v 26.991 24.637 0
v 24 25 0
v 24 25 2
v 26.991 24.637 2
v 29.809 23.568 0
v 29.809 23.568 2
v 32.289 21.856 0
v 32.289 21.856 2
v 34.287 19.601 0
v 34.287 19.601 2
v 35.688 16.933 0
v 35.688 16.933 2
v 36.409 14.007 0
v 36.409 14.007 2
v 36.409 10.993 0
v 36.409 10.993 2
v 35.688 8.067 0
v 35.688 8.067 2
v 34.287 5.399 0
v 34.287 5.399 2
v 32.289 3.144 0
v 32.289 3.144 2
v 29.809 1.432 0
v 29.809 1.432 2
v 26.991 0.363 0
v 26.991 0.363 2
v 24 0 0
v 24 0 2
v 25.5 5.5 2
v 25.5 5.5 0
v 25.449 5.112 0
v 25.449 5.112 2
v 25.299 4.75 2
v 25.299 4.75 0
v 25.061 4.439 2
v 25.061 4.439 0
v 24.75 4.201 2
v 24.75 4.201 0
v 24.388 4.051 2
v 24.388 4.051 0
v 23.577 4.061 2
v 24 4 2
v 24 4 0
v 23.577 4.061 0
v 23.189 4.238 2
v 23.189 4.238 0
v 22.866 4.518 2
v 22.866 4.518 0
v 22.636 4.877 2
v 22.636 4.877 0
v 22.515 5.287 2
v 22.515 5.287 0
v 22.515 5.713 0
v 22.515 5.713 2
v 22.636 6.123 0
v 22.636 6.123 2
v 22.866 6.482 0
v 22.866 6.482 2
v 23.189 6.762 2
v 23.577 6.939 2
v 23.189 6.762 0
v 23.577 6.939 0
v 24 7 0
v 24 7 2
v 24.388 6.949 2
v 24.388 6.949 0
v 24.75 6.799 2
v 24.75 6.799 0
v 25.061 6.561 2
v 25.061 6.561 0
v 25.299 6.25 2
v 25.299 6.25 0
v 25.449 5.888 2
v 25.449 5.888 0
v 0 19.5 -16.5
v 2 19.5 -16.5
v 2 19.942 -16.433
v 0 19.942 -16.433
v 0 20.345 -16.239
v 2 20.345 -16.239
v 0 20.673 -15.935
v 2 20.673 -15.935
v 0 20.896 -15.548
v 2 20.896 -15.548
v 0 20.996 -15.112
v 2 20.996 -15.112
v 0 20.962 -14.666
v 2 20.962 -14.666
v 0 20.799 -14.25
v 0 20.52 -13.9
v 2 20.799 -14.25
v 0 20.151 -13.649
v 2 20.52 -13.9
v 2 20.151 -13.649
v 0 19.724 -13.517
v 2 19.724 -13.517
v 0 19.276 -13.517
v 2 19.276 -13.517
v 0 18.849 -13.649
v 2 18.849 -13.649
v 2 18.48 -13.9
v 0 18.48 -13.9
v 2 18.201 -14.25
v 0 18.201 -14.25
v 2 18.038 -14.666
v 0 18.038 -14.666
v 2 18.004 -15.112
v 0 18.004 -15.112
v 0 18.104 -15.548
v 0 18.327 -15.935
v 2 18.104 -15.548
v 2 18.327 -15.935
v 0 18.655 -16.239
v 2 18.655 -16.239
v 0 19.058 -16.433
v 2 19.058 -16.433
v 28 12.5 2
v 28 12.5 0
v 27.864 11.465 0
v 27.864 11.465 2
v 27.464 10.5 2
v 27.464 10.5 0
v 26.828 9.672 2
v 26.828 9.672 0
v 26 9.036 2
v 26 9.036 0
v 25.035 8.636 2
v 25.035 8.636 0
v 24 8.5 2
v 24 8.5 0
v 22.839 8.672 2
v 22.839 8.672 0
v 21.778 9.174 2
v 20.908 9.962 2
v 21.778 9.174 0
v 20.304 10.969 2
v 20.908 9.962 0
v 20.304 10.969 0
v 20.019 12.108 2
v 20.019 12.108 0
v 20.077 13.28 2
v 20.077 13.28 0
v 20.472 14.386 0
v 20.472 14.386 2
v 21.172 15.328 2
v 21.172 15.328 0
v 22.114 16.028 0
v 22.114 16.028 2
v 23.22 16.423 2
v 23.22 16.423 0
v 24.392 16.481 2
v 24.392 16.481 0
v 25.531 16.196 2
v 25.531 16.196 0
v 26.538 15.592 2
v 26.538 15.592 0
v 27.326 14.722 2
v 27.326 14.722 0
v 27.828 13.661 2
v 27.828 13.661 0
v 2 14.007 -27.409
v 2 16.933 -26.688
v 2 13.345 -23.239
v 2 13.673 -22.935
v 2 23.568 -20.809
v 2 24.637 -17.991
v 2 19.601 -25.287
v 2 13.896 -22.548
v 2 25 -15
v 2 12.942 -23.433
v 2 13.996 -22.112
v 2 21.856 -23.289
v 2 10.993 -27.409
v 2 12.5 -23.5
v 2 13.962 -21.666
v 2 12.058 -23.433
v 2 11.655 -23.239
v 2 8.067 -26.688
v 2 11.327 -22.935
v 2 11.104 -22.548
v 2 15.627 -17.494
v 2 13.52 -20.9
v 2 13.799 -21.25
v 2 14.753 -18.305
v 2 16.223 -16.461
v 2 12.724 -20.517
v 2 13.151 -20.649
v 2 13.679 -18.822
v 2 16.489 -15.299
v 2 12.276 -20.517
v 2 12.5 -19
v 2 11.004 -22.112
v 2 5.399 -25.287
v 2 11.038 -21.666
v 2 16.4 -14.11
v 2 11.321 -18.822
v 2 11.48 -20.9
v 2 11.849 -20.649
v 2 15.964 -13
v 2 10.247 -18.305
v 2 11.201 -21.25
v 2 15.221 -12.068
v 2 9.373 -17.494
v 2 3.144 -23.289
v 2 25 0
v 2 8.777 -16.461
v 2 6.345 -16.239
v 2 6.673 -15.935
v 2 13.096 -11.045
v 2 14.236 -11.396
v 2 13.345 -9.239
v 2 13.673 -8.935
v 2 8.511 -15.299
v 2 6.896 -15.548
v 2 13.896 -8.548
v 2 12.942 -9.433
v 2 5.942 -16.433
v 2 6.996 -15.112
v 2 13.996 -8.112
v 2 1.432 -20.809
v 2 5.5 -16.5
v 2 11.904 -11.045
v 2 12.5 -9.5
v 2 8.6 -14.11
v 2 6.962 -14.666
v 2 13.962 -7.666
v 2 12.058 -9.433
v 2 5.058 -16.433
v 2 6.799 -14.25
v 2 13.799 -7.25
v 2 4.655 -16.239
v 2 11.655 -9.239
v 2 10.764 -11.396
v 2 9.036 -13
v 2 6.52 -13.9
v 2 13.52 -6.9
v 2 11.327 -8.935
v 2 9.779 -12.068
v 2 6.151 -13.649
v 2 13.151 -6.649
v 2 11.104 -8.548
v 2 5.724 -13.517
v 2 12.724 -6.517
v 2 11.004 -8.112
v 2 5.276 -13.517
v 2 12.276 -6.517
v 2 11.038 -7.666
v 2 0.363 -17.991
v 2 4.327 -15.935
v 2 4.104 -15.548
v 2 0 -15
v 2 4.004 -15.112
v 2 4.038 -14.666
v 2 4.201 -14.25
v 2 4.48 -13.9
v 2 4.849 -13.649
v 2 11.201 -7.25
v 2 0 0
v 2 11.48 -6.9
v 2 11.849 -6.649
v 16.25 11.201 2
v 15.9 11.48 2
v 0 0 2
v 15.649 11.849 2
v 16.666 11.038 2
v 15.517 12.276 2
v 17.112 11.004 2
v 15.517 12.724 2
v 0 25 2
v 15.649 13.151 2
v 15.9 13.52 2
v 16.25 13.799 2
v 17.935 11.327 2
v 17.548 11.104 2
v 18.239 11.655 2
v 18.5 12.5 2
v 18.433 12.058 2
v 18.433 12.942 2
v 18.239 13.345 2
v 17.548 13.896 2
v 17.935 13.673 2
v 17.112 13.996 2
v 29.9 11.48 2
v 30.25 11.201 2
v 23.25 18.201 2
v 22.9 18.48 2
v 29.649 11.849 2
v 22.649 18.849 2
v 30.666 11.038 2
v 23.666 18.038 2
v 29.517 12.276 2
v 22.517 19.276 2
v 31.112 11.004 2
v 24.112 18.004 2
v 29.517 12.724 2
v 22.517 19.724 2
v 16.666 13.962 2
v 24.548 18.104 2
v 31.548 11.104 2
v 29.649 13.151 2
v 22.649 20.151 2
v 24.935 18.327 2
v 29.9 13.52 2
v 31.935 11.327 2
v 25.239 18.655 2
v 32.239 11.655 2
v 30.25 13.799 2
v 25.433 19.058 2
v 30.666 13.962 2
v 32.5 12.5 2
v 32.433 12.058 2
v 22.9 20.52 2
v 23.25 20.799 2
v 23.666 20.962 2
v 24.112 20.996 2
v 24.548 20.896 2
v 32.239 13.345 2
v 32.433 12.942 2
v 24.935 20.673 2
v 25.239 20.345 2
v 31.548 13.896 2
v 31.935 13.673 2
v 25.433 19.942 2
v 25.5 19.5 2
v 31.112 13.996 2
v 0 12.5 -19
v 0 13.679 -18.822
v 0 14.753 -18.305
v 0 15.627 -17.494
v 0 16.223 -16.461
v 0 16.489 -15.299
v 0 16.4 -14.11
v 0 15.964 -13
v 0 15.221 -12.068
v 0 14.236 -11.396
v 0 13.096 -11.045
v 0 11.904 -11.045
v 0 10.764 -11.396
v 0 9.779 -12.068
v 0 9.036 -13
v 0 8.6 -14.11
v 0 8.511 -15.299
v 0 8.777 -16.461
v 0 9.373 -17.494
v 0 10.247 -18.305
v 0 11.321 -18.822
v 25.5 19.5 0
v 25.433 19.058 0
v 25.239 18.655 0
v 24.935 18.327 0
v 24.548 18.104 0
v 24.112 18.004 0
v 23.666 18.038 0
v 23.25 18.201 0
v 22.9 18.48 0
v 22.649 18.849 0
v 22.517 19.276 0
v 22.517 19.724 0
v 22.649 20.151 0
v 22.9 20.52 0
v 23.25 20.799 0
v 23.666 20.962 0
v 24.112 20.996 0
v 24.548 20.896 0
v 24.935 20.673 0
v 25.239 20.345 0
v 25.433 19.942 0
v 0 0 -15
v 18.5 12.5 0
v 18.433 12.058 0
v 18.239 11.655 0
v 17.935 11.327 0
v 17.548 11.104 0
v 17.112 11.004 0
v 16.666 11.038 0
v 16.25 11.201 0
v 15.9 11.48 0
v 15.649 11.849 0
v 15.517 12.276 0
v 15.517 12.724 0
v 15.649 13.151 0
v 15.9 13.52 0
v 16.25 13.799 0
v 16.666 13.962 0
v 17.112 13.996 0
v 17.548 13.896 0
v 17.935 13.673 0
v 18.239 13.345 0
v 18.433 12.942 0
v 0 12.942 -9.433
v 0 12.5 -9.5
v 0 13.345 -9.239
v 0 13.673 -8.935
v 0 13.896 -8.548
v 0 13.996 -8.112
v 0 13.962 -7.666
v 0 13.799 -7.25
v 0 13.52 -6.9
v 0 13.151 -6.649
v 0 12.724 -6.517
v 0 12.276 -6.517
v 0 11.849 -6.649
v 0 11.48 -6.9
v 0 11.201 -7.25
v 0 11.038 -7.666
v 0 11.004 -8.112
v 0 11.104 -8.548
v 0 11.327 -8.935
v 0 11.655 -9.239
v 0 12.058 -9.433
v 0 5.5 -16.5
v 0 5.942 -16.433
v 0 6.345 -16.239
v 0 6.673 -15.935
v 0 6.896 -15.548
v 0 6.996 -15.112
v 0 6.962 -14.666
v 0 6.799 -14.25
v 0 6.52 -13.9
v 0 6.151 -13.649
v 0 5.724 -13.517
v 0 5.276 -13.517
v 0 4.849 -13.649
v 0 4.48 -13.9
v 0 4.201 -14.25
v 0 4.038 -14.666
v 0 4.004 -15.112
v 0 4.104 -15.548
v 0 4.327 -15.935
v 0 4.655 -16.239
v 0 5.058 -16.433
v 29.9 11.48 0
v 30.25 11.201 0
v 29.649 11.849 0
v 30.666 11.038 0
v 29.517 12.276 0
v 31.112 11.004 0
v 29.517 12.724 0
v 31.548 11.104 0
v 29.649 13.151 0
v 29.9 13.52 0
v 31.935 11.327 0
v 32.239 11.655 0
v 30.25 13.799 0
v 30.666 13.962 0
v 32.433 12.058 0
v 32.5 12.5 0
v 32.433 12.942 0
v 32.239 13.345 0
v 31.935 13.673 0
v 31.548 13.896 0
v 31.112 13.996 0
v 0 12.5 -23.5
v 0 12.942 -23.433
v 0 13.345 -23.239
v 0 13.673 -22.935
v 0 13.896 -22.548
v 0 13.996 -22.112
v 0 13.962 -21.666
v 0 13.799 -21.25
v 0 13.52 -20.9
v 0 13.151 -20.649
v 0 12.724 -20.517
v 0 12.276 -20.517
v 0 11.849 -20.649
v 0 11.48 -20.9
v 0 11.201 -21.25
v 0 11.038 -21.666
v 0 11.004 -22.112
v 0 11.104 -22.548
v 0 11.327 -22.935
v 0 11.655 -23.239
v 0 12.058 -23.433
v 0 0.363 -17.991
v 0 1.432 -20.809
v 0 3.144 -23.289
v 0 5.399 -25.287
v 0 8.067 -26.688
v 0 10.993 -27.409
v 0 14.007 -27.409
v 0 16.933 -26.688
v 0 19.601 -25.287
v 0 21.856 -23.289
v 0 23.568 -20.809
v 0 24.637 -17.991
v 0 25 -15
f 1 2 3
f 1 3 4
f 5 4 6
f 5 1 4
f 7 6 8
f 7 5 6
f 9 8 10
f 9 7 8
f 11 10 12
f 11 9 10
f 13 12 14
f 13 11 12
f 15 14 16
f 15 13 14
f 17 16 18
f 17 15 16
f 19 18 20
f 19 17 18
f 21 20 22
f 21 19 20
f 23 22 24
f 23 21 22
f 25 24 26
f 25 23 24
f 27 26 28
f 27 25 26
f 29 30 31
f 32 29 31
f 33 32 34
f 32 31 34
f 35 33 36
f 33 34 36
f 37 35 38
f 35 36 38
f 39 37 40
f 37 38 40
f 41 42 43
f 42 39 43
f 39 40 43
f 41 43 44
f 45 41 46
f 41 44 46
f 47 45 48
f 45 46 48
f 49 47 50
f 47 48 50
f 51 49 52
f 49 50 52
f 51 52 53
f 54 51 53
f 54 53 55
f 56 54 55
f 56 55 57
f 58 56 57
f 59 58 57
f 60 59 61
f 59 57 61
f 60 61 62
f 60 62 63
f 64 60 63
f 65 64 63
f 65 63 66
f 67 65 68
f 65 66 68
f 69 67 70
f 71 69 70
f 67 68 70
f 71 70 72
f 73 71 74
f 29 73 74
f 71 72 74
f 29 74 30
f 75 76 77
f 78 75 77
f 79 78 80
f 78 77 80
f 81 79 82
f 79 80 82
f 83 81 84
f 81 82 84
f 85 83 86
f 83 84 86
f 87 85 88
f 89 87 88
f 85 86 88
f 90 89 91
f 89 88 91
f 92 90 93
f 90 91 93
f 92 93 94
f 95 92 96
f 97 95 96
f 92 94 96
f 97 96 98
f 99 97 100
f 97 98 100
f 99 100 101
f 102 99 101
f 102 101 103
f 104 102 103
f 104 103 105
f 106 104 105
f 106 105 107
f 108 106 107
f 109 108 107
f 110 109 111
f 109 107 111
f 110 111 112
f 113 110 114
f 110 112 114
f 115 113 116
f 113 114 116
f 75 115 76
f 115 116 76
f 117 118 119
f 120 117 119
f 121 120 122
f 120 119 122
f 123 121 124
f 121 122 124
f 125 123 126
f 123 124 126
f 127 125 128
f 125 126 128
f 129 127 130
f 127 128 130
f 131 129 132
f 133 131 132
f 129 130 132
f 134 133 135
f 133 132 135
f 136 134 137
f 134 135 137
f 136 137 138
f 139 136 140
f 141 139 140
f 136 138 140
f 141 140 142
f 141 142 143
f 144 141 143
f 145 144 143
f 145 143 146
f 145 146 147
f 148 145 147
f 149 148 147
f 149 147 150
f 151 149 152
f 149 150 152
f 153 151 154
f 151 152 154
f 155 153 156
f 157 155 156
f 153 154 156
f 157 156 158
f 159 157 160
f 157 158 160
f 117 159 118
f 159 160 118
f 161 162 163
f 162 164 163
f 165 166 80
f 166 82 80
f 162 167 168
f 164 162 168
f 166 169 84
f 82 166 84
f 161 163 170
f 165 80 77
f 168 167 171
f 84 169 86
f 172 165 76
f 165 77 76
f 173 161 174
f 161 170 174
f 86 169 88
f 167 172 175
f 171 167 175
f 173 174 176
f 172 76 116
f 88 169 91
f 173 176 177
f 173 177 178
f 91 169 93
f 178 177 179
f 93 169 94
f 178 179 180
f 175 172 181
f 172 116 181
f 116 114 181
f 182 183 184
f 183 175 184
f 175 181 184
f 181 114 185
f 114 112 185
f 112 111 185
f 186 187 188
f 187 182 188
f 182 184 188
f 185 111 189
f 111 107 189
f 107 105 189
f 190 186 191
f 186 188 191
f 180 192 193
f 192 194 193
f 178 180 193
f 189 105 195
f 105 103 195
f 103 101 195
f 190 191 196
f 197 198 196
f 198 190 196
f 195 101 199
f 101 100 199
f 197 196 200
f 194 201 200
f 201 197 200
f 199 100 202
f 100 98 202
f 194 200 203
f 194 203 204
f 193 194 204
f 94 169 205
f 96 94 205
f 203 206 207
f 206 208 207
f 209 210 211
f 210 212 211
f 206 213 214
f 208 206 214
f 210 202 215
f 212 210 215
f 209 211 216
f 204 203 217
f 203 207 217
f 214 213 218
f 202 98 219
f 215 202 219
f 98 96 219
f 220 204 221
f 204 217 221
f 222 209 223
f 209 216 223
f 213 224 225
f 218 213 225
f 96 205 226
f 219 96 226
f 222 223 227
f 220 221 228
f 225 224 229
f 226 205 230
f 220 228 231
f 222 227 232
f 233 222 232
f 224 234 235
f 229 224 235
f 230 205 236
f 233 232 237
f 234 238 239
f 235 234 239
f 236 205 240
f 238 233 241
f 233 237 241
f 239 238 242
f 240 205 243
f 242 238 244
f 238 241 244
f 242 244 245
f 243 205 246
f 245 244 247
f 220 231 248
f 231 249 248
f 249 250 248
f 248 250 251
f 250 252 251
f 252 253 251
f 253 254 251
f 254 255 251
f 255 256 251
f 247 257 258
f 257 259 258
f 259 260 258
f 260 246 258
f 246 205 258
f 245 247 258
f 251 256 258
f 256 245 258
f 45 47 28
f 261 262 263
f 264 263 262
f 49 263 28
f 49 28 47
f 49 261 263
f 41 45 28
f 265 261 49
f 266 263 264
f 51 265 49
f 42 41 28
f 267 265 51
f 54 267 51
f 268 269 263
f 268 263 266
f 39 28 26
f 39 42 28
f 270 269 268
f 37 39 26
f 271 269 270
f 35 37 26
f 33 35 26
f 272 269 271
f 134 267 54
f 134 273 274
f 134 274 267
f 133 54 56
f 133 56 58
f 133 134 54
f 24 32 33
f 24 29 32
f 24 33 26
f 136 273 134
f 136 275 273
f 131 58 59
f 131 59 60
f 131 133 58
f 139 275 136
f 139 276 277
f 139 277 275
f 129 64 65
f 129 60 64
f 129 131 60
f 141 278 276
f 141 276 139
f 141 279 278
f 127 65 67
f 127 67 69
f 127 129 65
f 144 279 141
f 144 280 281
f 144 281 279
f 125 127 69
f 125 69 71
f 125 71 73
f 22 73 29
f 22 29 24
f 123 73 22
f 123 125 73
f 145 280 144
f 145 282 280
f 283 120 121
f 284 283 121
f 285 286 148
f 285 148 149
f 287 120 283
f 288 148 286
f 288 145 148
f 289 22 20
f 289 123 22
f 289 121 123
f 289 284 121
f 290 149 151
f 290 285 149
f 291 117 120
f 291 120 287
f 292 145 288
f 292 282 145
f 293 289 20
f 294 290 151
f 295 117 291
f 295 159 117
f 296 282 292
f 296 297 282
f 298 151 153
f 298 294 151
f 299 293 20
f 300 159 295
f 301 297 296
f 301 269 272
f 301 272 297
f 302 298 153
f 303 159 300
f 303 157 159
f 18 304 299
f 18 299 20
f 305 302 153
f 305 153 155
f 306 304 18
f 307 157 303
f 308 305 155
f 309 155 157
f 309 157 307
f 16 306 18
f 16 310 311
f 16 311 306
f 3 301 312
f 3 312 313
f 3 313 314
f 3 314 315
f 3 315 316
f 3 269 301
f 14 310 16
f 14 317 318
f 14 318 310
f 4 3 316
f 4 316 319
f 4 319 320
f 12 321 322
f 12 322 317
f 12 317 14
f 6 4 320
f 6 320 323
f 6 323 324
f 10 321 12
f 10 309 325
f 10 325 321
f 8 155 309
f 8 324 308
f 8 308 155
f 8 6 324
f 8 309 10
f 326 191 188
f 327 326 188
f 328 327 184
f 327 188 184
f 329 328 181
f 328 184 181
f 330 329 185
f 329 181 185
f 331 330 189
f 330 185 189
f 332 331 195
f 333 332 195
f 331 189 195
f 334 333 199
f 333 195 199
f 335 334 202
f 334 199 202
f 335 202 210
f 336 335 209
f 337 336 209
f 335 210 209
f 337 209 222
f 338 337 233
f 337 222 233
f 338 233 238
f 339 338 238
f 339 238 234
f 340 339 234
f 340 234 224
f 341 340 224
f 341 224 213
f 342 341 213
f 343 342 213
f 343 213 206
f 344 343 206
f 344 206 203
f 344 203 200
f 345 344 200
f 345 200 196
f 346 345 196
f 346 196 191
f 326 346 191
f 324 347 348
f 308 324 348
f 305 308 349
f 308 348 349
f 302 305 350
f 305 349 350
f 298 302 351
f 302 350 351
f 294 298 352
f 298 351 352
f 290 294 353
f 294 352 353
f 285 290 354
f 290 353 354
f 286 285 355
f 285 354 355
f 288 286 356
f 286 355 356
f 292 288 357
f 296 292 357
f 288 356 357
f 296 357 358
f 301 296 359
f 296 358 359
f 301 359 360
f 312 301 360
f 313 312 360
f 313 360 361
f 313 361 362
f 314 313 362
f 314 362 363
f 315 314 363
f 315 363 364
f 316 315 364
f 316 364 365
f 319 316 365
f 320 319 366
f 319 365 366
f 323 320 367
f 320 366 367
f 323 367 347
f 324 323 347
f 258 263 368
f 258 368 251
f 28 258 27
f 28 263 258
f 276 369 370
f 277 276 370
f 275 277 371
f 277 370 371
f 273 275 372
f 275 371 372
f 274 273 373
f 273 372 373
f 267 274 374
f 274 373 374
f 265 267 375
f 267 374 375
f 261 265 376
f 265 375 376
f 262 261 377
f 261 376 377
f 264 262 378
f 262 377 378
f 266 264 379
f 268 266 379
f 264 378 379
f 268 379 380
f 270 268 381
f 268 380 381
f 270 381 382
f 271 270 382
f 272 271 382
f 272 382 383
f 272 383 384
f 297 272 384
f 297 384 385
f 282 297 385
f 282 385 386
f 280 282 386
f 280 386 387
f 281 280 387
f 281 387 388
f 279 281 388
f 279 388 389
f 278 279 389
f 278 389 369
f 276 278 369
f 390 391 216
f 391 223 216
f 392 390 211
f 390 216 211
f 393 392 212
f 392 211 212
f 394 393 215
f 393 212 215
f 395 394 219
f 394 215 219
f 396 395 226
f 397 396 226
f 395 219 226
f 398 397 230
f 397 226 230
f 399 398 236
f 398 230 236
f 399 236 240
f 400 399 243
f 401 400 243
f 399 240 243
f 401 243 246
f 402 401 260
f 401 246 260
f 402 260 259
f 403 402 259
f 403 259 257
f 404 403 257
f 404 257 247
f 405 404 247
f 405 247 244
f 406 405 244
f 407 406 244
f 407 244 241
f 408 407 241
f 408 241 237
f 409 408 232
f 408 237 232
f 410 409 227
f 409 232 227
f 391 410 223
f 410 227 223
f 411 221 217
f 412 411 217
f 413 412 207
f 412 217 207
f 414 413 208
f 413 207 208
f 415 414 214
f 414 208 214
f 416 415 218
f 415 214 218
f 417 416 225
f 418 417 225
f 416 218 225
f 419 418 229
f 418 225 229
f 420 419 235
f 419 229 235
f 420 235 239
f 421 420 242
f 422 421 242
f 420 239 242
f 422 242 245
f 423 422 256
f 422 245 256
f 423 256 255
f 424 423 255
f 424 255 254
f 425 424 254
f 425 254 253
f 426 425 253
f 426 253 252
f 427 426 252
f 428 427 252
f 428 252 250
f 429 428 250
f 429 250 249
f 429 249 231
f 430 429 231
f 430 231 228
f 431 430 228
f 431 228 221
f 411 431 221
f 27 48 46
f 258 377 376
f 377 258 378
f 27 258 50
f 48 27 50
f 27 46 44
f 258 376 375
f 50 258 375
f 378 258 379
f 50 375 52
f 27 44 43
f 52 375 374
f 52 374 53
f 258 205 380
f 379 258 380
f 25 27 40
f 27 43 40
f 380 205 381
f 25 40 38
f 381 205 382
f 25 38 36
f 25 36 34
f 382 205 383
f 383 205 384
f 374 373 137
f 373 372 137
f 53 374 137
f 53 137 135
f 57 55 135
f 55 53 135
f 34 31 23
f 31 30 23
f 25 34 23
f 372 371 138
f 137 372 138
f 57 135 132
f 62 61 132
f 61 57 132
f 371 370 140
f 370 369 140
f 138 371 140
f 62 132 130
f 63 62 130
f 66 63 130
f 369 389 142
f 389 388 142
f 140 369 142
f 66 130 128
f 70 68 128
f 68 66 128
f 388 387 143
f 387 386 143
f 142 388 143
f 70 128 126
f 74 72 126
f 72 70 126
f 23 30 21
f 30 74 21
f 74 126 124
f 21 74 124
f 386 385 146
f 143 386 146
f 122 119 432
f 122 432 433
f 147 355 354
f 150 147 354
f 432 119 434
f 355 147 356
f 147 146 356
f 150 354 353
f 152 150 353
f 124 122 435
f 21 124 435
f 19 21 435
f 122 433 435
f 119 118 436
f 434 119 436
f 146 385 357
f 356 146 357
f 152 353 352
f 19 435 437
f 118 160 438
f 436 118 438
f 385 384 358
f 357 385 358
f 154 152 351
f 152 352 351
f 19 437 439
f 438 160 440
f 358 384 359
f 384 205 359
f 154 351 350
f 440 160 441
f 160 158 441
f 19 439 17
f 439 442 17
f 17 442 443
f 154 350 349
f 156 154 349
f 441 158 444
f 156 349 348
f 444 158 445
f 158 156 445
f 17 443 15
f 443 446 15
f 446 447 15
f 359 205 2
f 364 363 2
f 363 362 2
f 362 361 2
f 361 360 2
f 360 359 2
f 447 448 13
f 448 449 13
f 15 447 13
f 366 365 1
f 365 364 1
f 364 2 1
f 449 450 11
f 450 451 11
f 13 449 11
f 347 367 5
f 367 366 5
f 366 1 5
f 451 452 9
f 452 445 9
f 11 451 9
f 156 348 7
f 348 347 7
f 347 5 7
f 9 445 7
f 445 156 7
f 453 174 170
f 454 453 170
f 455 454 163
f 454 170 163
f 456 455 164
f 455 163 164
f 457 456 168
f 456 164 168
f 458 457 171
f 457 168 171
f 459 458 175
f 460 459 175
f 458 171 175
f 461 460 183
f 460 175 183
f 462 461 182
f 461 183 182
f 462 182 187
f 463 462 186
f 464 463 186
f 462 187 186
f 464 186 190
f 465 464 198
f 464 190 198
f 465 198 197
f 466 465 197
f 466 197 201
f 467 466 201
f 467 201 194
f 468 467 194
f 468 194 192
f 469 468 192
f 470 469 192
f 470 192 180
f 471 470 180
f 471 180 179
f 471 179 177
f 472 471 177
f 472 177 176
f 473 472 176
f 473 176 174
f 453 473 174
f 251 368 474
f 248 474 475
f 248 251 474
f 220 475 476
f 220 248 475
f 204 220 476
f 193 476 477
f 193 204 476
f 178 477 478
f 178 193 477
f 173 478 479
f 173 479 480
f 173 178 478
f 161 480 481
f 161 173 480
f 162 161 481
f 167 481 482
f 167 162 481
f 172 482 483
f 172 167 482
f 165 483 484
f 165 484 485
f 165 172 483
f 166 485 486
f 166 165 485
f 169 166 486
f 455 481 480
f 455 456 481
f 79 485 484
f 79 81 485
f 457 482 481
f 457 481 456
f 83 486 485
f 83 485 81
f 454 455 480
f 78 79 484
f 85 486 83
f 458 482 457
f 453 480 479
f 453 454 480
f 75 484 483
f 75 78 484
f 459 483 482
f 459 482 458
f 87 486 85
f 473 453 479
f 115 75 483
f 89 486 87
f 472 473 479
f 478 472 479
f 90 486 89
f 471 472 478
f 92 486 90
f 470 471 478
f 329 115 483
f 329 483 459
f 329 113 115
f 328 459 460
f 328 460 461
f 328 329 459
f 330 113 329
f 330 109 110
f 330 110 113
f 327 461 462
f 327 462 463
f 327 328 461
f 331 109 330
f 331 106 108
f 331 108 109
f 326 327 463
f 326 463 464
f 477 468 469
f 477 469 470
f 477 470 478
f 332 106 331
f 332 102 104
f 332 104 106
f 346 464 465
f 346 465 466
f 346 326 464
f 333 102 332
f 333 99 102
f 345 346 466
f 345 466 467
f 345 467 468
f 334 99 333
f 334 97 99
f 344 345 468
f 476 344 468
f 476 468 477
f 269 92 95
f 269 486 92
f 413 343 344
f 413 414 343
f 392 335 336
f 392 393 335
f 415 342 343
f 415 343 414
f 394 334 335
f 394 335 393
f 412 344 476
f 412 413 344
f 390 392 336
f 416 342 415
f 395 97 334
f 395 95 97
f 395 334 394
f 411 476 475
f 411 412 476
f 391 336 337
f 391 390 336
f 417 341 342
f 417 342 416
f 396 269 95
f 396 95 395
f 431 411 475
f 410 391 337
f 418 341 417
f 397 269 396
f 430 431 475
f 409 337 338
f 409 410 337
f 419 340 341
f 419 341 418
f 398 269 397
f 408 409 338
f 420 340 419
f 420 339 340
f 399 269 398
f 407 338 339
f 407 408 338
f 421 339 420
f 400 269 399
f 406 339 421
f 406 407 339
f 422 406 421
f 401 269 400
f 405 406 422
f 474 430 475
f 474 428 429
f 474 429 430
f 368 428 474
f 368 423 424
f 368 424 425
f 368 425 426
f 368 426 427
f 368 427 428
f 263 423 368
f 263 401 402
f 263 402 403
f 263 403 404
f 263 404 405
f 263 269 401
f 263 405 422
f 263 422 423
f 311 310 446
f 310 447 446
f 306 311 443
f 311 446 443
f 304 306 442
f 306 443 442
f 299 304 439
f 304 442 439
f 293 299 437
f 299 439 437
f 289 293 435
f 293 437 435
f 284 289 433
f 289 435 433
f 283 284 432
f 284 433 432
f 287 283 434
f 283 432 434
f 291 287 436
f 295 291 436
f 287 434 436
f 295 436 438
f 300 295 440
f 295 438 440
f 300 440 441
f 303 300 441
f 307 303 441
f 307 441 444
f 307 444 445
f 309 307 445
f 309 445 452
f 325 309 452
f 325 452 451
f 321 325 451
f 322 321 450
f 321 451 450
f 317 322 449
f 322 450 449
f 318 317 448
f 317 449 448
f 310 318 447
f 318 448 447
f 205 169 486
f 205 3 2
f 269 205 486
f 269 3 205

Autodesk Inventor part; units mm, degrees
ref_plane "YZ Plane" through (0, 0, 0) normal (1, 0, 0) x (0, 1, 0)
ref_plane "XZ Plane" through (0, 0, 0) normal (0, 1, 0) x (-1, 0, 0)
ref_plane "XY Plane" through (0, 0, 0) normal (0, 0, 1) x (1, 0, 0)
sketch "Sketch1" plane through (0, 0, 0) normal (0, 0, 1) x (1, 0, 0)
  line L0 (0, 0) -> (24, 0)
  line L1 (24, 25) -> (0, 25)
  line L2 (0, 25) -> (0, 0)
  arc A0 (24, 0) -> (24, 25) centre (24, 12.5) ccw
  circle A1 centre (24, 12.5) radius 4
  circle A2 centre (24, 12.5) radius 7
  circle A3 centre (24, 19.5) radius 1.5
  circle A4 centre (17, 12.5) radius 1.5
  circle A5 centre (24, 5.5) radius 1.5
  circle A6 centre (31, 12.5) radius 1.5
  line L3 (24, 0) -> (24, 16.5)
  line L4 (24, 19.5) -> (24, 21)
  line L5 (0, 25) -> (2, 25)
  line L6 (2, 25) -> (2, 0)
  line L7 (2, 0) -> (0, 0)
  line L8 (0, 0) -> (0, 25)
  dimension "d2" = 8
  dimension "d3" = 14
  dimension "d4" = 3
  dimension "d0" = 24
  dimension "d1" = 25
  dimension "d7" = 360
  dimension "d11" = 2
extrude "Extrusion1" add sketch "Sketch1" along normal blind 2 contours L2 L1 L6 L0 | L6 L1 A0 L0 | A2 A4 A3 A6 A5
extrude "Extrusion2" add sketch "Sketch1" against normal blind 1 contours L2 L1 L6 L0
sketch "Sketch2" plane through (2, 0, 0) normal (1, 0, 0) x (0, 0, -1)
  line L0 (0, 25) -> (0, 0) projected
  line L1 (0, 25) -> (15, 25)
  line L2 (15, 25) -> (15, 0)
  line L3 (15, 0) -> (0, 0)
  line L4 (0, 0) -> (0, 25)
  circle A0 centre (15, 12.5) radius 12.5
  circle A1 centre (15, 12.5) radius 4
  circle A2 centre (15, 12.5) radius 7
  circle A3 centre (15, 19.5) radius 1.5
  circle A4 centre (8, 12.5) radius 1.5
  circle A5 centre (15, 5.5) radius 1.5
  circle A6 centre (22, 12.5) radius 1.5
  point P0 (15, 0)
  dimension "d17" = 14
  dimension "d14" = 15
  dimension "d15" = 25
  dimension "d16" = 8
  dimension "d18" = 3
  dimension "d21" = 360
extrude "Extrusion3" add sketch "Sketch2" against normal blind 2 contours L1 A0 L3 L0 | A0 L2 A5 A2 A6 A3 | L2 A3 A2 A4 A5 A0 | A3 L2 A1 A5 A2 A4 | A3 A2 A6 A5 L2 A1
properties part number "Bracket ANGULO"
